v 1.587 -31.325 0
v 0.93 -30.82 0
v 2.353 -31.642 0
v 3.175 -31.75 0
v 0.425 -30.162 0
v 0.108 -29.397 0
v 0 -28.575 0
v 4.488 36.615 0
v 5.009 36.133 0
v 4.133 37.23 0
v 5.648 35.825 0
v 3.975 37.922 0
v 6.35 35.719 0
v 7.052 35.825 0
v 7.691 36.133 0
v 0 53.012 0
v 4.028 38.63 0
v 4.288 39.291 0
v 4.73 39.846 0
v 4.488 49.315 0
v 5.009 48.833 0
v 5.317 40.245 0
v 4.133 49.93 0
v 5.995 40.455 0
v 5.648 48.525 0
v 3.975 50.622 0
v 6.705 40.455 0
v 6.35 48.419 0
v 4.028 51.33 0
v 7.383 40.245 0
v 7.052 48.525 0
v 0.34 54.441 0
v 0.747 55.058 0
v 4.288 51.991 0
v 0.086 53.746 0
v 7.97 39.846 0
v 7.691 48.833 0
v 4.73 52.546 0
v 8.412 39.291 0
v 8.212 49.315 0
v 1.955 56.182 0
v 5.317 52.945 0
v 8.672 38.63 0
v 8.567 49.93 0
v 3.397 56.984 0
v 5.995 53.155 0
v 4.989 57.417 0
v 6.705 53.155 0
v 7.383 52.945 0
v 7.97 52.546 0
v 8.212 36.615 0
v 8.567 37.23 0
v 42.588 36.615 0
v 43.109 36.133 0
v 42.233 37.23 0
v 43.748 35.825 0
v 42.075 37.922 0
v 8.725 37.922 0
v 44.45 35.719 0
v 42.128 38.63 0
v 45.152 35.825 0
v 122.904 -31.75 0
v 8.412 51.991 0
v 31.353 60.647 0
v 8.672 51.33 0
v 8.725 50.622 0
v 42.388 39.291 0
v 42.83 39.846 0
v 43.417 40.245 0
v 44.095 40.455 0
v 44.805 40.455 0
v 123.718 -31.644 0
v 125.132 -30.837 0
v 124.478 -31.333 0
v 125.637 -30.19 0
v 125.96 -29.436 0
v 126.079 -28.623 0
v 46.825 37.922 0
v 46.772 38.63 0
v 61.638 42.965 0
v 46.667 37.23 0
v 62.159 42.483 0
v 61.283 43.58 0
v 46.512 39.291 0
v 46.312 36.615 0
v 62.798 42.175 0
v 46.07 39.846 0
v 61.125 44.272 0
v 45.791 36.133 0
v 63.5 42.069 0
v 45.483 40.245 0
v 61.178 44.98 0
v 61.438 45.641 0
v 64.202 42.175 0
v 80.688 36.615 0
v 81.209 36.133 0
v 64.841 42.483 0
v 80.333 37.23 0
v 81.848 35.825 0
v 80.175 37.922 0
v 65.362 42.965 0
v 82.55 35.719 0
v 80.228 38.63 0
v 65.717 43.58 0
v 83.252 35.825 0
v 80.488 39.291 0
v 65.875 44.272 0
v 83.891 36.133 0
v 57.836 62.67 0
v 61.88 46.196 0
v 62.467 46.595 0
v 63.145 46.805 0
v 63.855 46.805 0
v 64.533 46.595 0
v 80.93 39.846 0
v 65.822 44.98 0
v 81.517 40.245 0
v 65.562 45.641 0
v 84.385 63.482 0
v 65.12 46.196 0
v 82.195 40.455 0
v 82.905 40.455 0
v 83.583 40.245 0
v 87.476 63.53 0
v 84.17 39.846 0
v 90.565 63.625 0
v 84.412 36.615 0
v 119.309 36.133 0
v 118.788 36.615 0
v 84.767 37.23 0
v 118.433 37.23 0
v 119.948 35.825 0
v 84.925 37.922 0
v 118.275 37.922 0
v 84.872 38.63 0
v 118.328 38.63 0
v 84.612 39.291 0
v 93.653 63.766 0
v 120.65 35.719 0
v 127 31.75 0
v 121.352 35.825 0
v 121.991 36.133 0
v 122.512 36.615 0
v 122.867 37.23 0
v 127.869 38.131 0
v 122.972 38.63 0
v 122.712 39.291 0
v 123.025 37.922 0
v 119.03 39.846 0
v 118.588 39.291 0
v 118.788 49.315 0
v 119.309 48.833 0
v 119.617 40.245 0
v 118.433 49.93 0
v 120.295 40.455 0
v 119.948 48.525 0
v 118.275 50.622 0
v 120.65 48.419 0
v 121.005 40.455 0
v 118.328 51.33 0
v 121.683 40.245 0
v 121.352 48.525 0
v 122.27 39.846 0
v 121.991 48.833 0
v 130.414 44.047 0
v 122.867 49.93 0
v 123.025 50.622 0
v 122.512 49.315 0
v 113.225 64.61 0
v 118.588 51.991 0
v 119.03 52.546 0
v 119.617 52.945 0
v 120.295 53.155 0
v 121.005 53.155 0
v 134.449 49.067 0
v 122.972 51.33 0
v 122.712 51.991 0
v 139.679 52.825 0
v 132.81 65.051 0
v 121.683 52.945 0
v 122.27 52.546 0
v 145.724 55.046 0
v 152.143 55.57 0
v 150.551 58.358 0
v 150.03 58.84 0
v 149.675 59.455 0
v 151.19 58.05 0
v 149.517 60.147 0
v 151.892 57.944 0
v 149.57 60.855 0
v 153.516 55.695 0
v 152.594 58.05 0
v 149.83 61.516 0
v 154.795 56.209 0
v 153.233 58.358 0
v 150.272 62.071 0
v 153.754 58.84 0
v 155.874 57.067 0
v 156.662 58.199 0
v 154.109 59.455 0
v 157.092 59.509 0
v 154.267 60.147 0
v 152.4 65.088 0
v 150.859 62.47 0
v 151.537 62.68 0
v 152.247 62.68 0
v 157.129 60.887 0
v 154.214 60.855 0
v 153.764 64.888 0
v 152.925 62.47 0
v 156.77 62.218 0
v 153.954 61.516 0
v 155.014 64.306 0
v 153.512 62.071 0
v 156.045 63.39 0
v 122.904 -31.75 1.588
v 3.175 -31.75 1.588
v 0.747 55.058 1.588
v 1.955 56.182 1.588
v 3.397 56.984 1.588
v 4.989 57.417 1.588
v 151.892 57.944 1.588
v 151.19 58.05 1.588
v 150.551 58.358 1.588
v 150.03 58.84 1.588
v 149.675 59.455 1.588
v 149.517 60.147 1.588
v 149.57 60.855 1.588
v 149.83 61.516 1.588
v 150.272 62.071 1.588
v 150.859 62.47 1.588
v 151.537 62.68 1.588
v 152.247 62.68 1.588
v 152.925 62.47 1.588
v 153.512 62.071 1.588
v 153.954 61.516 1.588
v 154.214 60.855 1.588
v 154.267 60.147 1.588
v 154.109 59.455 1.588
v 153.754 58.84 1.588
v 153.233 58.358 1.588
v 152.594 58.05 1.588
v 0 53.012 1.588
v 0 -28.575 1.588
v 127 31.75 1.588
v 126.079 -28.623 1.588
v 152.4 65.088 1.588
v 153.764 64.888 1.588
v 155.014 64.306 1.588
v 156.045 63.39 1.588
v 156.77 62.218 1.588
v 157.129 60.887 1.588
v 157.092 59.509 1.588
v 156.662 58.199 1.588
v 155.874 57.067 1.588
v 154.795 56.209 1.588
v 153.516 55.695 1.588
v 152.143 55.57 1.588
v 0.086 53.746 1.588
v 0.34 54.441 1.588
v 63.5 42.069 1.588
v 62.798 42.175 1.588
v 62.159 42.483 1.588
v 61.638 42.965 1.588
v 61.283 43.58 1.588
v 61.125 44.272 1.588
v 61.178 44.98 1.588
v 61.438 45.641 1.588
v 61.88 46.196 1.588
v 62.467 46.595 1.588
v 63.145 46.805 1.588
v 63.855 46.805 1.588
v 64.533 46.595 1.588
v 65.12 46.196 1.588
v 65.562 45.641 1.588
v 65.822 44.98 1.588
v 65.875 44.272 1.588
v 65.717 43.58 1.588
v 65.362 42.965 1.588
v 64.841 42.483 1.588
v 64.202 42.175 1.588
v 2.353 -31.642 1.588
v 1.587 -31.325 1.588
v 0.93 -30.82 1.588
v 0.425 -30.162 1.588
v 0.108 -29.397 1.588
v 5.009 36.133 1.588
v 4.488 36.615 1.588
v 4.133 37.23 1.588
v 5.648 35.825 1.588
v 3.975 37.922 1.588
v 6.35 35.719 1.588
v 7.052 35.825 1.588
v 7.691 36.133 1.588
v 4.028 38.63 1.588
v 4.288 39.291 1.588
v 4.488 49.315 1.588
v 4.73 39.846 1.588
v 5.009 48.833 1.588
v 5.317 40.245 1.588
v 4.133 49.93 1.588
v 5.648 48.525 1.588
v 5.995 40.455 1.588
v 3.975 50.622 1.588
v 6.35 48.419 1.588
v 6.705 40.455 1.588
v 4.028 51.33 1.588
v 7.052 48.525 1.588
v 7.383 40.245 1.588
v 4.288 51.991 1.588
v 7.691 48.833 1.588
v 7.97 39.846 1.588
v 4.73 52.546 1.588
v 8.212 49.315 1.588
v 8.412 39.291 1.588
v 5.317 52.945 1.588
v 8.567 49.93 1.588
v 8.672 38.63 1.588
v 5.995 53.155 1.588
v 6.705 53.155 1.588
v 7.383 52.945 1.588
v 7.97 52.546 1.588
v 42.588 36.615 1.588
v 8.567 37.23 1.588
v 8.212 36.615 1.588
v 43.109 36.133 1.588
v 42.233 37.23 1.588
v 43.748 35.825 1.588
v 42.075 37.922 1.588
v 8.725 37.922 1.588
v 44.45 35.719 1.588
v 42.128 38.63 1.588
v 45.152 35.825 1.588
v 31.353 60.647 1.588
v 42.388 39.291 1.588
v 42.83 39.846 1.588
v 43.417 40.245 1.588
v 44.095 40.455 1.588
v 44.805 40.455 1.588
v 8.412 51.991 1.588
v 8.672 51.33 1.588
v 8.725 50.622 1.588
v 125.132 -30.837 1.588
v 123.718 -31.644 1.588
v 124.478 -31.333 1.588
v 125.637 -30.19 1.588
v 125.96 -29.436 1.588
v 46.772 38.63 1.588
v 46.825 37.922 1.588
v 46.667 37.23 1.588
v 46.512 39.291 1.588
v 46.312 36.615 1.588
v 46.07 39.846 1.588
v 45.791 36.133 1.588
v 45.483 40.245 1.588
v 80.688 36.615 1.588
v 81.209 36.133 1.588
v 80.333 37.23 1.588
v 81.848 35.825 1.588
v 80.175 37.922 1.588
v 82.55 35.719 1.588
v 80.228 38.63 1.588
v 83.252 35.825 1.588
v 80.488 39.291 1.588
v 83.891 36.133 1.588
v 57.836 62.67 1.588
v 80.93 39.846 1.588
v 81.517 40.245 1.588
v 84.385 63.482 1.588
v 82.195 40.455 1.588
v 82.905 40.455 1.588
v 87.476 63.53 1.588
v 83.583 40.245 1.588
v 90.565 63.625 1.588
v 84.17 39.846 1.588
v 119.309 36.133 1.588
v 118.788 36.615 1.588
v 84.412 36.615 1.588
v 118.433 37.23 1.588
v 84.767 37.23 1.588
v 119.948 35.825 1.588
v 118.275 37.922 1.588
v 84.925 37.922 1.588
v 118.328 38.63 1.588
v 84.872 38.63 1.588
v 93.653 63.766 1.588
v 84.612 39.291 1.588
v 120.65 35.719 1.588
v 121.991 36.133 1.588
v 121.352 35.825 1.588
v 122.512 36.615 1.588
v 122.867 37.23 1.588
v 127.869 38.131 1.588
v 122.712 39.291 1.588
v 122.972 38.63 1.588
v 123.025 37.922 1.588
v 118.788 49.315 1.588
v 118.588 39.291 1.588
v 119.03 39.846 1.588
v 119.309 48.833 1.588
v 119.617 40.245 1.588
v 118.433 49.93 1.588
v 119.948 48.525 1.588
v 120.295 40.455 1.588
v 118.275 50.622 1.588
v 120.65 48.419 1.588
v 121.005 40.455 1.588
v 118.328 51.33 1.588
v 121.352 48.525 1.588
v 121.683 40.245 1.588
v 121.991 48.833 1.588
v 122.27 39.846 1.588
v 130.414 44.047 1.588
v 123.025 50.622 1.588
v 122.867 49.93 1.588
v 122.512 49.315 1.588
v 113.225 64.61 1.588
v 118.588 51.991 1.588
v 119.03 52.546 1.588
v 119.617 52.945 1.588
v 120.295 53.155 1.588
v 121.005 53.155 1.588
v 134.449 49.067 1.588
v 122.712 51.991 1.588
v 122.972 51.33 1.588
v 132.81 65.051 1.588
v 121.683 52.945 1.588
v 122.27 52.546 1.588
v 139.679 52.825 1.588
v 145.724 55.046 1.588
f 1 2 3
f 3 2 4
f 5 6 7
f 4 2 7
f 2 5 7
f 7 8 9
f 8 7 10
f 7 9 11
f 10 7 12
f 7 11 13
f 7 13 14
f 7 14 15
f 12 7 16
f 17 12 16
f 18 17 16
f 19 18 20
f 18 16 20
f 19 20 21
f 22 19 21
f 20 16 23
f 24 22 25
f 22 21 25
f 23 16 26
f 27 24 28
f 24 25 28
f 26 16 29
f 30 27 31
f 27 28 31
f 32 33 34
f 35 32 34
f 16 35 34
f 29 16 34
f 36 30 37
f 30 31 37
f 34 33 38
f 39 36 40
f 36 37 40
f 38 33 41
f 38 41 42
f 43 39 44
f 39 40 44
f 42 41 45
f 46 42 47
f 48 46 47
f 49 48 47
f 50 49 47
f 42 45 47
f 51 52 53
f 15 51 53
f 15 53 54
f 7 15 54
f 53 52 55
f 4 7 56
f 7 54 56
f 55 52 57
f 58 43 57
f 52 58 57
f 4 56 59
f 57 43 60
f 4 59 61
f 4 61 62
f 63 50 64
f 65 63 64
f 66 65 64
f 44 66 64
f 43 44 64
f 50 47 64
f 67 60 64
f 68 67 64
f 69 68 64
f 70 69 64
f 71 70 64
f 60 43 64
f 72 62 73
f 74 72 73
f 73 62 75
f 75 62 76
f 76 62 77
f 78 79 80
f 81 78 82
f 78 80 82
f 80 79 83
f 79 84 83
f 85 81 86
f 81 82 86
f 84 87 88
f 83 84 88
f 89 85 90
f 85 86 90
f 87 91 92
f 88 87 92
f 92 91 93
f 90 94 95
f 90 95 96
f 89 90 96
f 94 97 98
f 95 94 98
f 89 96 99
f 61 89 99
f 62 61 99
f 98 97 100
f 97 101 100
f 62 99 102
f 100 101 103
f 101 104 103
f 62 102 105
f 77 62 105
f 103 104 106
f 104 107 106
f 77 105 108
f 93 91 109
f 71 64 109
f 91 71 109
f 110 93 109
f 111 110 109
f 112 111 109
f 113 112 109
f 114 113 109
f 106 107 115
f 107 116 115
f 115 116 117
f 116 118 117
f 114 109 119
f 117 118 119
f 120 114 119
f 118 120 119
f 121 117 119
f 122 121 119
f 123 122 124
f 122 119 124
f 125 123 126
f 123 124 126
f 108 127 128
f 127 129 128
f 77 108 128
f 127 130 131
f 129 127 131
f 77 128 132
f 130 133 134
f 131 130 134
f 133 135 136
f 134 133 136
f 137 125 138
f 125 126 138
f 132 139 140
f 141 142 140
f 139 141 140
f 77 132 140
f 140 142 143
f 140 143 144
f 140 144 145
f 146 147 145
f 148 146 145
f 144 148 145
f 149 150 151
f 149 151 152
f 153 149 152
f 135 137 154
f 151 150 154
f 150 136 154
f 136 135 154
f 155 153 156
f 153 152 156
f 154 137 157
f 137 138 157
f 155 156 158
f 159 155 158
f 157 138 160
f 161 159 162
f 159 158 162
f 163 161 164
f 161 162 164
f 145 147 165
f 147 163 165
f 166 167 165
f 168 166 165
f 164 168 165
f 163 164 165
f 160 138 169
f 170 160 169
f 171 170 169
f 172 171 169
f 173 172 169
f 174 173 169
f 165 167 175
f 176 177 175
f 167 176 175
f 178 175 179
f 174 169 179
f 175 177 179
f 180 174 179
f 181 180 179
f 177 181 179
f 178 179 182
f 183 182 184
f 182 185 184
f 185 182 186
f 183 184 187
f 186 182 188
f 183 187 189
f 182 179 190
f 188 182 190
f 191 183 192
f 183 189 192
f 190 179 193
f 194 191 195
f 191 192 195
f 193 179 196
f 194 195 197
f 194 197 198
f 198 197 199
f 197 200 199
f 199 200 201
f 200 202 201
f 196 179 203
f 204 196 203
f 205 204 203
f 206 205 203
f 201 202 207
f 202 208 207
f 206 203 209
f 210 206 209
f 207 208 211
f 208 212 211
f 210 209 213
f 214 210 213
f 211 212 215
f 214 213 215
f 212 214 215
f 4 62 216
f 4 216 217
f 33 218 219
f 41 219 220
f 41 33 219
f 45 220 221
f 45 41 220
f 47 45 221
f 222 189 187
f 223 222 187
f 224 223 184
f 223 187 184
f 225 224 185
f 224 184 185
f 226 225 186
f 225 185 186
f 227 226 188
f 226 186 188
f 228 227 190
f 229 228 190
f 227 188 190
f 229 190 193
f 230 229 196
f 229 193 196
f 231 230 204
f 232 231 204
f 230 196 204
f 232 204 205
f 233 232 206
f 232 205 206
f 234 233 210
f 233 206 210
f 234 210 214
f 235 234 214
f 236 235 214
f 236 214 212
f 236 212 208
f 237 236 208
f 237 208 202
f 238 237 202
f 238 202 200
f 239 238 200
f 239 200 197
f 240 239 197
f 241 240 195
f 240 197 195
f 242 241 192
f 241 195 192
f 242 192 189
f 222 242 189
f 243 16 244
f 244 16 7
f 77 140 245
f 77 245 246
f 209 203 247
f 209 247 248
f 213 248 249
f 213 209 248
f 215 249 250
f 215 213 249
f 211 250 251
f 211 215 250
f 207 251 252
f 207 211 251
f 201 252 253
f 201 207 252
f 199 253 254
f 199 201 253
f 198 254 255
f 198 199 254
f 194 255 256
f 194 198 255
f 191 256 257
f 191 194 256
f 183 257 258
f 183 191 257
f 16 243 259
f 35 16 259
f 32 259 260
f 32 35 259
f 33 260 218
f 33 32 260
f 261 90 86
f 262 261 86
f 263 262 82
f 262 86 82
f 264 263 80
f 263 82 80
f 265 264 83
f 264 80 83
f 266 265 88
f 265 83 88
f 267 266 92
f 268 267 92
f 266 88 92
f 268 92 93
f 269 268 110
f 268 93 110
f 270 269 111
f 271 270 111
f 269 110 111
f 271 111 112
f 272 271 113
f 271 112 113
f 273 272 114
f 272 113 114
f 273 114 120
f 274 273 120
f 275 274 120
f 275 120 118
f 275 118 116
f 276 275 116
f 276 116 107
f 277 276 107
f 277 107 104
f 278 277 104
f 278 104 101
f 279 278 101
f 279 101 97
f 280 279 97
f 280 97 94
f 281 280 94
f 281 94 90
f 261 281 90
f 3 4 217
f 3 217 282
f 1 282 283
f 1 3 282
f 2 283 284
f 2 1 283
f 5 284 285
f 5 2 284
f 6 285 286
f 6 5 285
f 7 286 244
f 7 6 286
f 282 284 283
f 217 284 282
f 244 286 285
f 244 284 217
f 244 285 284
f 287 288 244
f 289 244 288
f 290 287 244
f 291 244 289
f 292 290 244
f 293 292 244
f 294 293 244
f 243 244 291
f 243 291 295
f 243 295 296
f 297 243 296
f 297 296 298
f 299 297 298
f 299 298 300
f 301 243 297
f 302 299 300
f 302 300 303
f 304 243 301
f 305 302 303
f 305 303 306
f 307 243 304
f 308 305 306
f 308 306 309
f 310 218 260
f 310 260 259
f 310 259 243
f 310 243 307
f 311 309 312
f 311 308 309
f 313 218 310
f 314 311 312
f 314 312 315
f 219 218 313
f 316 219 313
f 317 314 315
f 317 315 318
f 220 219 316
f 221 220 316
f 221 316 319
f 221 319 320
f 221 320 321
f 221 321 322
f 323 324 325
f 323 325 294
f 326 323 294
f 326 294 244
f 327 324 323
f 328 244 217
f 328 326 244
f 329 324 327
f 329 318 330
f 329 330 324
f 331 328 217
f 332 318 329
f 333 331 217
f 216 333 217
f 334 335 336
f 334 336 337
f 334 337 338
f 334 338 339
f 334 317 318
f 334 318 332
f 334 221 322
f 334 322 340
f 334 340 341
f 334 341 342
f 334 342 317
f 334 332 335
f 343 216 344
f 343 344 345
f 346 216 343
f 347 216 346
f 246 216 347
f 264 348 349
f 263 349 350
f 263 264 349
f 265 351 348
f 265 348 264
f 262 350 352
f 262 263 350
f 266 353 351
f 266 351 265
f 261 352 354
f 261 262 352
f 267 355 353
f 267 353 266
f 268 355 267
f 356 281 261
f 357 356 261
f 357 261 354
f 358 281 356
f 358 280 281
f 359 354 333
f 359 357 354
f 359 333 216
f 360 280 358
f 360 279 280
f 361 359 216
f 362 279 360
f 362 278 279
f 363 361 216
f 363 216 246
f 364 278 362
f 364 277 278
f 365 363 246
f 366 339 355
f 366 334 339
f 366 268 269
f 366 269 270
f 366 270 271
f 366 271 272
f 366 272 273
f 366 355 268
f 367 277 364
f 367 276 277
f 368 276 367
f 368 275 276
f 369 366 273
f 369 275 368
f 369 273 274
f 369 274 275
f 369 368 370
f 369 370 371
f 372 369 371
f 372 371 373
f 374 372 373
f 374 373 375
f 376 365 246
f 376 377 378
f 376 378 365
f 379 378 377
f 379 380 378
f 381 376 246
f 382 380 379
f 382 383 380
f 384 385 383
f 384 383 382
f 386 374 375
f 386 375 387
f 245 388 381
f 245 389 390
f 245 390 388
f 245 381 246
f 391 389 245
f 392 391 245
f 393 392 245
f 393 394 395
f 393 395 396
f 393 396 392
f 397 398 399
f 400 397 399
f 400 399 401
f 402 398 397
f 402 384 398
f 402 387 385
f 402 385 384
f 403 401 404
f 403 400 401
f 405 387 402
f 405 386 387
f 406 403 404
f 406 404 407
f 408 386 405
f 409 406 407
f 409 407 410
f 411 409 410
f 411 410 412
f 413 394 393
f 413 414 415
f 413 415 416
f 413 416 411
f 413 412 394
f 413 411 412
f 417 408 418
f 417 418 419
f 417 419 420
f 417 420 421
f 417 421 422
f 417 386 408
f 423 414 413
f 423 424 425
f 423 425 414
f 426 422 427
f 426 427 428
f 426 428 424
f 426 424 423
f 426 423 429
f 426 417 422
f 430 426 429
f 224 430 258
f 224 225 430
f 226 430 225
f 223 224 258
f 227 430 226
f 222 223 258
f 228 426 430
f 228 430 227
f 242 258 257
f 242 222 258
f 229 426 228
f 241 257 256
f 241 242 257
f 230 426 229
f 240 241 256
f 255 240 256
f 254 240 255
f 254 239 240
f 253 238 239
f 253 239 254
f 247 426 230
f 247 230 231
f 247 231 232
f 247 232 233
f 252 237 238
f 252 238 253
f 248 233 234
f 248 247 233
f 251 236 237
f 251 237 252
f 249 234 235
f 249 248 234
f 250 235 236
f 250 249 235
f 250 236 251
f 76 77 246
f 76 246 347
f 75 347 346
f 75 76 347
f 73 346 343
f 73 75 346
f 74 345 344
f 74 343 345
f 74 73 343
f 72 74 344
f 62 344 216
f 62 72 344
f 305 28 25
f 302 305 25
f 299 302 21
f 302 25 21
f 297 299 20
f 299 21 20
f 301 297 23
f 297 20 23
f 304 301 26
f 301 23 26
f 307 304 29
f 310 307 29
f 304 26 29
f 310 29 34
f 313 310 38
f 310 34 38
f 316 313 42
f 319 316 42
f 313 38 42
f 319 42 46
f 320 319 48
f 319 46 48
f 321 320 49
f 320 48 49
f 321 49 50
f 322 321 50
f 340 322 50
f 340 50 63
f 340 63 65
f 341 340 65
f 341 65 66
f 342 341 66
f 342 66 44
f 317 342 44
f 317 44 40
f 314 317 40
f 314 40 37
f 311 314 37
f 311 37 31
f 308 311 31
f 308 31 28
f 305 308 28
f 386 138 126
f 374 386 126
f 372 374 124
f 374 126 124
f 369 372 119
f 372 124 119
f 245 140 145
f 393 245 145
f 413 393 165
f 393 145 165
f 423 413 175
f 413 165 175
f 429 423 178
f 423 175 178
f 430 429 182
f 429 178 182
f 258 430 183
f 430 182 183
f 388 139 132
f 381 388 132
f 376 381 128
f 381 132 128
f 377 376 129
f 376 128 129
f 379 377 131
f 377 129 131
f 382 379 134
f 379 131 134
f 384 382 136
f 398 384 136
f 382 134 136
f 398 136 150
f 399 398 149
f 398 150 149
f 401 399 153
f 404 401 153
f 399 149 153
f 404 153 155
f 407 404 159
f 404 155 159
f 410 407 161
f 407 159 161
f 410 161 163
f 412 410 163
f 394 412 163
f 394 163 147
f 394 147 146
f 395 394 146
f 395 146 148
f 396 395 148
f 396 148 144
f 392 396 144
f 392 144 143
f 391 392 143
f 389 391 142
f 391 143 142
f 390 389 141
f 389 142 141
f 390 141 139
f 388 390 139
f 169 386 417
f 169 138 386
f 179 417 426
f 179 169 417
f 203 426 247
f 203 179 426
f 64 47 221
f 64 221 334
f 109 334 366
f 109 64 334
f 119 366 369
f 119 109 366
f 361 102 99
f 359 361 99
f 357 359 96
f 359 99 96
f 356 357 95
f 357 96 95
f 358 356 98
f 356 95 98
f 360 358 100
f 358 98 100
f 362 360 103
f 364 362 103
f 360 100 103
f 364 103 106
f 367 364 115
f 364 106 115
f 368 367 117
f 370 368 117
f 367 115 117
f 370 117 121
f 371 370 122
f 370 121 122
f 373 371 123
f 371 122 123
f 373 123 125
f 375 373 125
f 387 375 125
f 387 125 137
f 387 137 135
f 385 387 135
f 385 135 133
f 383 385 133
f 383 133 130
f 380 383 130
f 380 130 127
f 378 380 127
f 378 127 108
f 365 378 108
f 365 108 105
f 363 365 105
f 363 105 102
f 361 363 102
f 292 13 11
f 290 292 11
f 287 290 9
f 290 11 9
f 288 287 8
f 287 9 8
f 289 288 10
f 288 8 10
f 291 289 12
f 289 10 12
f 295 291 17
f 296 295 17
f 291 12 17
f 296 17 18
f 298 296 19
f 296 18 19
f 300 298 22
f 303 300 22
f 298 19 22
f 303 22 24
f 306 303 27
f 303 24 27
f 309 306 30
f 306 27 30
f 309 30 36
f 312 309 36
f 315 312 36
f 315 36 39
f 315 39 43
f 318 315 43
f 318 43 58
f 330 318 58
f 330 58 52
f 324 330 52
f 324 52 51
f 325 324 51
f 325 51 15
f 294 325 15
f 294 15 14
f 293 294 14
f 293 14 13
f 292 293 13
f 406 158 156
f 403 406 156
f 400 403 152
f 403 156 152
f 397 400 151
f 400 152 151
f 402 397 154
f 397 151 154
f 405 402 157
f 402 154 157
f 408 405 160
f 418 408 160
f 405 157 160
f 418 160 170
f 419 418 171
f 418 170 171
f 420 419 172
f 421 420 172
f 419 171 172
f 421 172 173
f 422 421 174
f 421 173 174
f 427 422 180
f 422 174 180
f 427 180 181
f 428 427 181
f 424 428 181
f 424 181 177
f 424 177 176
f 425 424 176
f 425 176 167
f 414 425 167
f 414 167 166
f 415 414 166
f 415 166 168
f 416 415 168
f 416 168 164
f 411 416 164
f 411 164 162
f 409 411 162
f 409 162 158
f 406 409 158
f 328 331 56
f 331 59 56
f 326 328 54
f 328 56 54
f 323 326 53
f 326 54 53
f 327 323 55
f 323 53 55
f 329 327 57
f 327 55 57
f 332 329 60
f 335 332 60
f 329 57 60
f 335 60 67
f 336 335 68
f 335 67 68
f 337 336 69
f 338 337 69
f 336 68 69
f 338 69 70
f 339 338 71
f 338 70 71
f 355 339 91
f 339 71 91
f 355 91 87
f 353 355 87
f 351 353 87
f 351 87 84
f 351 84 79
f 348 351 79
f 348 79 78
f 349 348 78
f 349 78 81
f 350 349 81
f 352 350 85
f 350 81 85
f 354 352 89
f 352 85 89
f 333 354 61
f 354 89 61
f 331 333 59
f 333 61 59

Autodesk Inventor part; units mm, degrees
ref_plane "YZ Plane" through (0, 0, 0) normal (1, 0, 0) x (0, 1, 0)
ref_plane "XZ Plane" through (0, 0, 0) normal (0, 1, 0) x (-1, 0, 0)
ref_plane "XY Plane" through (0, 0, 0) normal (0, 0, 1) x (1, 0, 0)
sketch "Sketch1" plane through (0, 0, 0) normal (0, 0, 1) x (1, 0, 0)
  line L0 (127, 63.5) -> (127, 57.15)
  line L1 (127, 57.15) -> (127, 31.75)
  line L2 (127, 31.75) -> (152.4, 31.75)
  line L3 (0, 60.325) -> (0, 63.5)
  line L4 (0, 63.5) -> (0, 57.15)
  arc A0 (152.4, 57.15) -> (127, 31.75) centre (152.4, 31.75) ccw construction
  line L5 (127, 63.5) -> (152.4, 63.5) construction
  line L6 (152.4, 57.15) -> (152.4, 63.5) construction
  arc A1 (152.4, 57.15) -> (152.4, 63.5) centre (152.4, 60.325) ccw construction
  line L7 (127, 63.5) -> (88.9, 63.5) construction
  line L8 (0, 57.15) -> (1.3137, 57.15)
  line L9 (3.175, 57.15) -> (3.175, 53.975)
  arc A2 (3.175, 57.15) -> (0, 53.975) centre (3.175, 53.975) ccw
  arc A3 (84.3846, 63.4825) -> (4.9889, 57.4173) centre (88.9, -518.3187) ccw
  arc A4 (4.9889, 57.4173) -> (0.7473, 55.0582) centre (5.9749, 50.6519) ccw
  arc A5 (0.7473, 55.0582) -> (0, 53.0119) centre (3.175, 53.0119) ccw
  circle A6 centre (152.4, 60.325) radius 4.7625
  arc A7 (152.1428, 55.5695) -> (127, 31.75) centre (150.8543, 31.75) ccw
  line L10 (127, 60.325) -> (152.4, 60.325) construction
  arc A8 (152.4, 65.0875) -> (93.6534, 63.766) centre (144.3966, -885.5701) ccw
  arc A9 (84.3846, 63.4825) -> (93.6534, 63.766) centre (82.8076, 266.6764) ccw
  line L11 (0, 57.15) -> (0, 31.75)
  line L12 (0, 31.75) -> (0, -28.575)
  line L13 (127, 31.75) -> (126.0787, -28.6234)
  line L14 (122.9041, -31.75) -> (3.175, -31.75)
  arc A10 (0, -28.575) -> (3.175, -31.75) centre (3.175, -28.575) ccw
  arc A11 (122.9041, -31.75) -> (126.0787, -28.6234) centre (122.9041, -28.575) ccw
  point P0 (127, 44.45)
  point P1 (0, -31.75)
  point P2 (126.031, -31.75)
  point P3 (0, 53.0119)
  dimension "d15" = 6.35
  dimension "d23" = 25.4
  dimension "d24" = 25.4
  dimension "d25" = 6.35
  dimension "d27" = 0
  dimension "d28" = 38.1
  dimension "d29" = 3.175
  dimension "d31" = 3.175
  dimension "d39" = 9.525
  dimension "d40" = 203.2
  dimension "d41" = 25.4
  dimension "d42" = 63.5
  dimension "d43" = 3.175
extrude "Extrusion1" add sketch "Sketch1" along normal blind 1.5875 contours A4 A3 A9 A8 A6 A7 L13 A11 L14 A10 L12 L11 A5 | A6
sketch "Sketch2" plane through (0, 0, 1.5875) normal (0, 0, 1) x (1, 0, 0)
  line L0 (127, 63.5) -> (0, 63.5) projected
  line L1 (0, 63.5) -> (0, 50.8)
  line L2 (0, 63.5) -> (0, 0) projected
  line L3 (0, 50.8) -> (6.35, 50.8)
  line L4 (6.35, 50.8) -> (6.35, 38.1)
  line L5 (6.35, 50.8) -> (120.65, 50.8)
  line L6 (120.65, 50.8) -> (120.65, 38.1)
  line L7 (63.5, 50.8) -> (63.5, 44.45)
  line L8 (127, 63.5) -> (127, 60.325)
  line L9 (127, 60.325) -> (151.892, 60.325)
  line L10 (120.65, 38.1) -> (82.55, 38.1)
  line L11 (6.35, 38.1) -> (44.45, 38.1)
  point P0 (0, 60.325)
  point P1 (3.175, 63.5)
  dimension "d4" = 12.7
  dimension "d5" = 6.35
  dimension "d6" = 12.7
  dimension "d7" = 114.3
  dimension "d32" = 3.175
  dimension "d33" = 24.892
  dimension "d34" = 38.1
  dimension "d35" = 38.1
hole "Hole1" at (6.35, 38.1, 1.5875) at (6.35, 50.8, 1.5875) at (120.65, 38.1, 1.5875) at (120.65, 50.8, 1.5875) at (63.5, 44.45, 1.5875) at (151.892, 60.325, 1.5875) at (44.45, 38.1, 1.5875) at (82.55, 38.1, 1.5875) direction (0, 0, -1) diameter 4.7625 end through all
sketch "Sketch3" plane through (0, 0, 1.5875) normal (0, 0, 1) x (1, 0, 0)
  line L0 (0, 0) -> (0, 31.75)
  line L1 (0, 53.0119) -> (0, 3.175) projected
  line L2 (127, 3.175) -> (127, 31.75) projected
  line L3 (0, 31.75) -> (127, 31.75)
  dimension "d36" = 31.75
feature "Bend Part1" [suppressed]
properties part number "wings" material "Polycarbonate, Clear"
